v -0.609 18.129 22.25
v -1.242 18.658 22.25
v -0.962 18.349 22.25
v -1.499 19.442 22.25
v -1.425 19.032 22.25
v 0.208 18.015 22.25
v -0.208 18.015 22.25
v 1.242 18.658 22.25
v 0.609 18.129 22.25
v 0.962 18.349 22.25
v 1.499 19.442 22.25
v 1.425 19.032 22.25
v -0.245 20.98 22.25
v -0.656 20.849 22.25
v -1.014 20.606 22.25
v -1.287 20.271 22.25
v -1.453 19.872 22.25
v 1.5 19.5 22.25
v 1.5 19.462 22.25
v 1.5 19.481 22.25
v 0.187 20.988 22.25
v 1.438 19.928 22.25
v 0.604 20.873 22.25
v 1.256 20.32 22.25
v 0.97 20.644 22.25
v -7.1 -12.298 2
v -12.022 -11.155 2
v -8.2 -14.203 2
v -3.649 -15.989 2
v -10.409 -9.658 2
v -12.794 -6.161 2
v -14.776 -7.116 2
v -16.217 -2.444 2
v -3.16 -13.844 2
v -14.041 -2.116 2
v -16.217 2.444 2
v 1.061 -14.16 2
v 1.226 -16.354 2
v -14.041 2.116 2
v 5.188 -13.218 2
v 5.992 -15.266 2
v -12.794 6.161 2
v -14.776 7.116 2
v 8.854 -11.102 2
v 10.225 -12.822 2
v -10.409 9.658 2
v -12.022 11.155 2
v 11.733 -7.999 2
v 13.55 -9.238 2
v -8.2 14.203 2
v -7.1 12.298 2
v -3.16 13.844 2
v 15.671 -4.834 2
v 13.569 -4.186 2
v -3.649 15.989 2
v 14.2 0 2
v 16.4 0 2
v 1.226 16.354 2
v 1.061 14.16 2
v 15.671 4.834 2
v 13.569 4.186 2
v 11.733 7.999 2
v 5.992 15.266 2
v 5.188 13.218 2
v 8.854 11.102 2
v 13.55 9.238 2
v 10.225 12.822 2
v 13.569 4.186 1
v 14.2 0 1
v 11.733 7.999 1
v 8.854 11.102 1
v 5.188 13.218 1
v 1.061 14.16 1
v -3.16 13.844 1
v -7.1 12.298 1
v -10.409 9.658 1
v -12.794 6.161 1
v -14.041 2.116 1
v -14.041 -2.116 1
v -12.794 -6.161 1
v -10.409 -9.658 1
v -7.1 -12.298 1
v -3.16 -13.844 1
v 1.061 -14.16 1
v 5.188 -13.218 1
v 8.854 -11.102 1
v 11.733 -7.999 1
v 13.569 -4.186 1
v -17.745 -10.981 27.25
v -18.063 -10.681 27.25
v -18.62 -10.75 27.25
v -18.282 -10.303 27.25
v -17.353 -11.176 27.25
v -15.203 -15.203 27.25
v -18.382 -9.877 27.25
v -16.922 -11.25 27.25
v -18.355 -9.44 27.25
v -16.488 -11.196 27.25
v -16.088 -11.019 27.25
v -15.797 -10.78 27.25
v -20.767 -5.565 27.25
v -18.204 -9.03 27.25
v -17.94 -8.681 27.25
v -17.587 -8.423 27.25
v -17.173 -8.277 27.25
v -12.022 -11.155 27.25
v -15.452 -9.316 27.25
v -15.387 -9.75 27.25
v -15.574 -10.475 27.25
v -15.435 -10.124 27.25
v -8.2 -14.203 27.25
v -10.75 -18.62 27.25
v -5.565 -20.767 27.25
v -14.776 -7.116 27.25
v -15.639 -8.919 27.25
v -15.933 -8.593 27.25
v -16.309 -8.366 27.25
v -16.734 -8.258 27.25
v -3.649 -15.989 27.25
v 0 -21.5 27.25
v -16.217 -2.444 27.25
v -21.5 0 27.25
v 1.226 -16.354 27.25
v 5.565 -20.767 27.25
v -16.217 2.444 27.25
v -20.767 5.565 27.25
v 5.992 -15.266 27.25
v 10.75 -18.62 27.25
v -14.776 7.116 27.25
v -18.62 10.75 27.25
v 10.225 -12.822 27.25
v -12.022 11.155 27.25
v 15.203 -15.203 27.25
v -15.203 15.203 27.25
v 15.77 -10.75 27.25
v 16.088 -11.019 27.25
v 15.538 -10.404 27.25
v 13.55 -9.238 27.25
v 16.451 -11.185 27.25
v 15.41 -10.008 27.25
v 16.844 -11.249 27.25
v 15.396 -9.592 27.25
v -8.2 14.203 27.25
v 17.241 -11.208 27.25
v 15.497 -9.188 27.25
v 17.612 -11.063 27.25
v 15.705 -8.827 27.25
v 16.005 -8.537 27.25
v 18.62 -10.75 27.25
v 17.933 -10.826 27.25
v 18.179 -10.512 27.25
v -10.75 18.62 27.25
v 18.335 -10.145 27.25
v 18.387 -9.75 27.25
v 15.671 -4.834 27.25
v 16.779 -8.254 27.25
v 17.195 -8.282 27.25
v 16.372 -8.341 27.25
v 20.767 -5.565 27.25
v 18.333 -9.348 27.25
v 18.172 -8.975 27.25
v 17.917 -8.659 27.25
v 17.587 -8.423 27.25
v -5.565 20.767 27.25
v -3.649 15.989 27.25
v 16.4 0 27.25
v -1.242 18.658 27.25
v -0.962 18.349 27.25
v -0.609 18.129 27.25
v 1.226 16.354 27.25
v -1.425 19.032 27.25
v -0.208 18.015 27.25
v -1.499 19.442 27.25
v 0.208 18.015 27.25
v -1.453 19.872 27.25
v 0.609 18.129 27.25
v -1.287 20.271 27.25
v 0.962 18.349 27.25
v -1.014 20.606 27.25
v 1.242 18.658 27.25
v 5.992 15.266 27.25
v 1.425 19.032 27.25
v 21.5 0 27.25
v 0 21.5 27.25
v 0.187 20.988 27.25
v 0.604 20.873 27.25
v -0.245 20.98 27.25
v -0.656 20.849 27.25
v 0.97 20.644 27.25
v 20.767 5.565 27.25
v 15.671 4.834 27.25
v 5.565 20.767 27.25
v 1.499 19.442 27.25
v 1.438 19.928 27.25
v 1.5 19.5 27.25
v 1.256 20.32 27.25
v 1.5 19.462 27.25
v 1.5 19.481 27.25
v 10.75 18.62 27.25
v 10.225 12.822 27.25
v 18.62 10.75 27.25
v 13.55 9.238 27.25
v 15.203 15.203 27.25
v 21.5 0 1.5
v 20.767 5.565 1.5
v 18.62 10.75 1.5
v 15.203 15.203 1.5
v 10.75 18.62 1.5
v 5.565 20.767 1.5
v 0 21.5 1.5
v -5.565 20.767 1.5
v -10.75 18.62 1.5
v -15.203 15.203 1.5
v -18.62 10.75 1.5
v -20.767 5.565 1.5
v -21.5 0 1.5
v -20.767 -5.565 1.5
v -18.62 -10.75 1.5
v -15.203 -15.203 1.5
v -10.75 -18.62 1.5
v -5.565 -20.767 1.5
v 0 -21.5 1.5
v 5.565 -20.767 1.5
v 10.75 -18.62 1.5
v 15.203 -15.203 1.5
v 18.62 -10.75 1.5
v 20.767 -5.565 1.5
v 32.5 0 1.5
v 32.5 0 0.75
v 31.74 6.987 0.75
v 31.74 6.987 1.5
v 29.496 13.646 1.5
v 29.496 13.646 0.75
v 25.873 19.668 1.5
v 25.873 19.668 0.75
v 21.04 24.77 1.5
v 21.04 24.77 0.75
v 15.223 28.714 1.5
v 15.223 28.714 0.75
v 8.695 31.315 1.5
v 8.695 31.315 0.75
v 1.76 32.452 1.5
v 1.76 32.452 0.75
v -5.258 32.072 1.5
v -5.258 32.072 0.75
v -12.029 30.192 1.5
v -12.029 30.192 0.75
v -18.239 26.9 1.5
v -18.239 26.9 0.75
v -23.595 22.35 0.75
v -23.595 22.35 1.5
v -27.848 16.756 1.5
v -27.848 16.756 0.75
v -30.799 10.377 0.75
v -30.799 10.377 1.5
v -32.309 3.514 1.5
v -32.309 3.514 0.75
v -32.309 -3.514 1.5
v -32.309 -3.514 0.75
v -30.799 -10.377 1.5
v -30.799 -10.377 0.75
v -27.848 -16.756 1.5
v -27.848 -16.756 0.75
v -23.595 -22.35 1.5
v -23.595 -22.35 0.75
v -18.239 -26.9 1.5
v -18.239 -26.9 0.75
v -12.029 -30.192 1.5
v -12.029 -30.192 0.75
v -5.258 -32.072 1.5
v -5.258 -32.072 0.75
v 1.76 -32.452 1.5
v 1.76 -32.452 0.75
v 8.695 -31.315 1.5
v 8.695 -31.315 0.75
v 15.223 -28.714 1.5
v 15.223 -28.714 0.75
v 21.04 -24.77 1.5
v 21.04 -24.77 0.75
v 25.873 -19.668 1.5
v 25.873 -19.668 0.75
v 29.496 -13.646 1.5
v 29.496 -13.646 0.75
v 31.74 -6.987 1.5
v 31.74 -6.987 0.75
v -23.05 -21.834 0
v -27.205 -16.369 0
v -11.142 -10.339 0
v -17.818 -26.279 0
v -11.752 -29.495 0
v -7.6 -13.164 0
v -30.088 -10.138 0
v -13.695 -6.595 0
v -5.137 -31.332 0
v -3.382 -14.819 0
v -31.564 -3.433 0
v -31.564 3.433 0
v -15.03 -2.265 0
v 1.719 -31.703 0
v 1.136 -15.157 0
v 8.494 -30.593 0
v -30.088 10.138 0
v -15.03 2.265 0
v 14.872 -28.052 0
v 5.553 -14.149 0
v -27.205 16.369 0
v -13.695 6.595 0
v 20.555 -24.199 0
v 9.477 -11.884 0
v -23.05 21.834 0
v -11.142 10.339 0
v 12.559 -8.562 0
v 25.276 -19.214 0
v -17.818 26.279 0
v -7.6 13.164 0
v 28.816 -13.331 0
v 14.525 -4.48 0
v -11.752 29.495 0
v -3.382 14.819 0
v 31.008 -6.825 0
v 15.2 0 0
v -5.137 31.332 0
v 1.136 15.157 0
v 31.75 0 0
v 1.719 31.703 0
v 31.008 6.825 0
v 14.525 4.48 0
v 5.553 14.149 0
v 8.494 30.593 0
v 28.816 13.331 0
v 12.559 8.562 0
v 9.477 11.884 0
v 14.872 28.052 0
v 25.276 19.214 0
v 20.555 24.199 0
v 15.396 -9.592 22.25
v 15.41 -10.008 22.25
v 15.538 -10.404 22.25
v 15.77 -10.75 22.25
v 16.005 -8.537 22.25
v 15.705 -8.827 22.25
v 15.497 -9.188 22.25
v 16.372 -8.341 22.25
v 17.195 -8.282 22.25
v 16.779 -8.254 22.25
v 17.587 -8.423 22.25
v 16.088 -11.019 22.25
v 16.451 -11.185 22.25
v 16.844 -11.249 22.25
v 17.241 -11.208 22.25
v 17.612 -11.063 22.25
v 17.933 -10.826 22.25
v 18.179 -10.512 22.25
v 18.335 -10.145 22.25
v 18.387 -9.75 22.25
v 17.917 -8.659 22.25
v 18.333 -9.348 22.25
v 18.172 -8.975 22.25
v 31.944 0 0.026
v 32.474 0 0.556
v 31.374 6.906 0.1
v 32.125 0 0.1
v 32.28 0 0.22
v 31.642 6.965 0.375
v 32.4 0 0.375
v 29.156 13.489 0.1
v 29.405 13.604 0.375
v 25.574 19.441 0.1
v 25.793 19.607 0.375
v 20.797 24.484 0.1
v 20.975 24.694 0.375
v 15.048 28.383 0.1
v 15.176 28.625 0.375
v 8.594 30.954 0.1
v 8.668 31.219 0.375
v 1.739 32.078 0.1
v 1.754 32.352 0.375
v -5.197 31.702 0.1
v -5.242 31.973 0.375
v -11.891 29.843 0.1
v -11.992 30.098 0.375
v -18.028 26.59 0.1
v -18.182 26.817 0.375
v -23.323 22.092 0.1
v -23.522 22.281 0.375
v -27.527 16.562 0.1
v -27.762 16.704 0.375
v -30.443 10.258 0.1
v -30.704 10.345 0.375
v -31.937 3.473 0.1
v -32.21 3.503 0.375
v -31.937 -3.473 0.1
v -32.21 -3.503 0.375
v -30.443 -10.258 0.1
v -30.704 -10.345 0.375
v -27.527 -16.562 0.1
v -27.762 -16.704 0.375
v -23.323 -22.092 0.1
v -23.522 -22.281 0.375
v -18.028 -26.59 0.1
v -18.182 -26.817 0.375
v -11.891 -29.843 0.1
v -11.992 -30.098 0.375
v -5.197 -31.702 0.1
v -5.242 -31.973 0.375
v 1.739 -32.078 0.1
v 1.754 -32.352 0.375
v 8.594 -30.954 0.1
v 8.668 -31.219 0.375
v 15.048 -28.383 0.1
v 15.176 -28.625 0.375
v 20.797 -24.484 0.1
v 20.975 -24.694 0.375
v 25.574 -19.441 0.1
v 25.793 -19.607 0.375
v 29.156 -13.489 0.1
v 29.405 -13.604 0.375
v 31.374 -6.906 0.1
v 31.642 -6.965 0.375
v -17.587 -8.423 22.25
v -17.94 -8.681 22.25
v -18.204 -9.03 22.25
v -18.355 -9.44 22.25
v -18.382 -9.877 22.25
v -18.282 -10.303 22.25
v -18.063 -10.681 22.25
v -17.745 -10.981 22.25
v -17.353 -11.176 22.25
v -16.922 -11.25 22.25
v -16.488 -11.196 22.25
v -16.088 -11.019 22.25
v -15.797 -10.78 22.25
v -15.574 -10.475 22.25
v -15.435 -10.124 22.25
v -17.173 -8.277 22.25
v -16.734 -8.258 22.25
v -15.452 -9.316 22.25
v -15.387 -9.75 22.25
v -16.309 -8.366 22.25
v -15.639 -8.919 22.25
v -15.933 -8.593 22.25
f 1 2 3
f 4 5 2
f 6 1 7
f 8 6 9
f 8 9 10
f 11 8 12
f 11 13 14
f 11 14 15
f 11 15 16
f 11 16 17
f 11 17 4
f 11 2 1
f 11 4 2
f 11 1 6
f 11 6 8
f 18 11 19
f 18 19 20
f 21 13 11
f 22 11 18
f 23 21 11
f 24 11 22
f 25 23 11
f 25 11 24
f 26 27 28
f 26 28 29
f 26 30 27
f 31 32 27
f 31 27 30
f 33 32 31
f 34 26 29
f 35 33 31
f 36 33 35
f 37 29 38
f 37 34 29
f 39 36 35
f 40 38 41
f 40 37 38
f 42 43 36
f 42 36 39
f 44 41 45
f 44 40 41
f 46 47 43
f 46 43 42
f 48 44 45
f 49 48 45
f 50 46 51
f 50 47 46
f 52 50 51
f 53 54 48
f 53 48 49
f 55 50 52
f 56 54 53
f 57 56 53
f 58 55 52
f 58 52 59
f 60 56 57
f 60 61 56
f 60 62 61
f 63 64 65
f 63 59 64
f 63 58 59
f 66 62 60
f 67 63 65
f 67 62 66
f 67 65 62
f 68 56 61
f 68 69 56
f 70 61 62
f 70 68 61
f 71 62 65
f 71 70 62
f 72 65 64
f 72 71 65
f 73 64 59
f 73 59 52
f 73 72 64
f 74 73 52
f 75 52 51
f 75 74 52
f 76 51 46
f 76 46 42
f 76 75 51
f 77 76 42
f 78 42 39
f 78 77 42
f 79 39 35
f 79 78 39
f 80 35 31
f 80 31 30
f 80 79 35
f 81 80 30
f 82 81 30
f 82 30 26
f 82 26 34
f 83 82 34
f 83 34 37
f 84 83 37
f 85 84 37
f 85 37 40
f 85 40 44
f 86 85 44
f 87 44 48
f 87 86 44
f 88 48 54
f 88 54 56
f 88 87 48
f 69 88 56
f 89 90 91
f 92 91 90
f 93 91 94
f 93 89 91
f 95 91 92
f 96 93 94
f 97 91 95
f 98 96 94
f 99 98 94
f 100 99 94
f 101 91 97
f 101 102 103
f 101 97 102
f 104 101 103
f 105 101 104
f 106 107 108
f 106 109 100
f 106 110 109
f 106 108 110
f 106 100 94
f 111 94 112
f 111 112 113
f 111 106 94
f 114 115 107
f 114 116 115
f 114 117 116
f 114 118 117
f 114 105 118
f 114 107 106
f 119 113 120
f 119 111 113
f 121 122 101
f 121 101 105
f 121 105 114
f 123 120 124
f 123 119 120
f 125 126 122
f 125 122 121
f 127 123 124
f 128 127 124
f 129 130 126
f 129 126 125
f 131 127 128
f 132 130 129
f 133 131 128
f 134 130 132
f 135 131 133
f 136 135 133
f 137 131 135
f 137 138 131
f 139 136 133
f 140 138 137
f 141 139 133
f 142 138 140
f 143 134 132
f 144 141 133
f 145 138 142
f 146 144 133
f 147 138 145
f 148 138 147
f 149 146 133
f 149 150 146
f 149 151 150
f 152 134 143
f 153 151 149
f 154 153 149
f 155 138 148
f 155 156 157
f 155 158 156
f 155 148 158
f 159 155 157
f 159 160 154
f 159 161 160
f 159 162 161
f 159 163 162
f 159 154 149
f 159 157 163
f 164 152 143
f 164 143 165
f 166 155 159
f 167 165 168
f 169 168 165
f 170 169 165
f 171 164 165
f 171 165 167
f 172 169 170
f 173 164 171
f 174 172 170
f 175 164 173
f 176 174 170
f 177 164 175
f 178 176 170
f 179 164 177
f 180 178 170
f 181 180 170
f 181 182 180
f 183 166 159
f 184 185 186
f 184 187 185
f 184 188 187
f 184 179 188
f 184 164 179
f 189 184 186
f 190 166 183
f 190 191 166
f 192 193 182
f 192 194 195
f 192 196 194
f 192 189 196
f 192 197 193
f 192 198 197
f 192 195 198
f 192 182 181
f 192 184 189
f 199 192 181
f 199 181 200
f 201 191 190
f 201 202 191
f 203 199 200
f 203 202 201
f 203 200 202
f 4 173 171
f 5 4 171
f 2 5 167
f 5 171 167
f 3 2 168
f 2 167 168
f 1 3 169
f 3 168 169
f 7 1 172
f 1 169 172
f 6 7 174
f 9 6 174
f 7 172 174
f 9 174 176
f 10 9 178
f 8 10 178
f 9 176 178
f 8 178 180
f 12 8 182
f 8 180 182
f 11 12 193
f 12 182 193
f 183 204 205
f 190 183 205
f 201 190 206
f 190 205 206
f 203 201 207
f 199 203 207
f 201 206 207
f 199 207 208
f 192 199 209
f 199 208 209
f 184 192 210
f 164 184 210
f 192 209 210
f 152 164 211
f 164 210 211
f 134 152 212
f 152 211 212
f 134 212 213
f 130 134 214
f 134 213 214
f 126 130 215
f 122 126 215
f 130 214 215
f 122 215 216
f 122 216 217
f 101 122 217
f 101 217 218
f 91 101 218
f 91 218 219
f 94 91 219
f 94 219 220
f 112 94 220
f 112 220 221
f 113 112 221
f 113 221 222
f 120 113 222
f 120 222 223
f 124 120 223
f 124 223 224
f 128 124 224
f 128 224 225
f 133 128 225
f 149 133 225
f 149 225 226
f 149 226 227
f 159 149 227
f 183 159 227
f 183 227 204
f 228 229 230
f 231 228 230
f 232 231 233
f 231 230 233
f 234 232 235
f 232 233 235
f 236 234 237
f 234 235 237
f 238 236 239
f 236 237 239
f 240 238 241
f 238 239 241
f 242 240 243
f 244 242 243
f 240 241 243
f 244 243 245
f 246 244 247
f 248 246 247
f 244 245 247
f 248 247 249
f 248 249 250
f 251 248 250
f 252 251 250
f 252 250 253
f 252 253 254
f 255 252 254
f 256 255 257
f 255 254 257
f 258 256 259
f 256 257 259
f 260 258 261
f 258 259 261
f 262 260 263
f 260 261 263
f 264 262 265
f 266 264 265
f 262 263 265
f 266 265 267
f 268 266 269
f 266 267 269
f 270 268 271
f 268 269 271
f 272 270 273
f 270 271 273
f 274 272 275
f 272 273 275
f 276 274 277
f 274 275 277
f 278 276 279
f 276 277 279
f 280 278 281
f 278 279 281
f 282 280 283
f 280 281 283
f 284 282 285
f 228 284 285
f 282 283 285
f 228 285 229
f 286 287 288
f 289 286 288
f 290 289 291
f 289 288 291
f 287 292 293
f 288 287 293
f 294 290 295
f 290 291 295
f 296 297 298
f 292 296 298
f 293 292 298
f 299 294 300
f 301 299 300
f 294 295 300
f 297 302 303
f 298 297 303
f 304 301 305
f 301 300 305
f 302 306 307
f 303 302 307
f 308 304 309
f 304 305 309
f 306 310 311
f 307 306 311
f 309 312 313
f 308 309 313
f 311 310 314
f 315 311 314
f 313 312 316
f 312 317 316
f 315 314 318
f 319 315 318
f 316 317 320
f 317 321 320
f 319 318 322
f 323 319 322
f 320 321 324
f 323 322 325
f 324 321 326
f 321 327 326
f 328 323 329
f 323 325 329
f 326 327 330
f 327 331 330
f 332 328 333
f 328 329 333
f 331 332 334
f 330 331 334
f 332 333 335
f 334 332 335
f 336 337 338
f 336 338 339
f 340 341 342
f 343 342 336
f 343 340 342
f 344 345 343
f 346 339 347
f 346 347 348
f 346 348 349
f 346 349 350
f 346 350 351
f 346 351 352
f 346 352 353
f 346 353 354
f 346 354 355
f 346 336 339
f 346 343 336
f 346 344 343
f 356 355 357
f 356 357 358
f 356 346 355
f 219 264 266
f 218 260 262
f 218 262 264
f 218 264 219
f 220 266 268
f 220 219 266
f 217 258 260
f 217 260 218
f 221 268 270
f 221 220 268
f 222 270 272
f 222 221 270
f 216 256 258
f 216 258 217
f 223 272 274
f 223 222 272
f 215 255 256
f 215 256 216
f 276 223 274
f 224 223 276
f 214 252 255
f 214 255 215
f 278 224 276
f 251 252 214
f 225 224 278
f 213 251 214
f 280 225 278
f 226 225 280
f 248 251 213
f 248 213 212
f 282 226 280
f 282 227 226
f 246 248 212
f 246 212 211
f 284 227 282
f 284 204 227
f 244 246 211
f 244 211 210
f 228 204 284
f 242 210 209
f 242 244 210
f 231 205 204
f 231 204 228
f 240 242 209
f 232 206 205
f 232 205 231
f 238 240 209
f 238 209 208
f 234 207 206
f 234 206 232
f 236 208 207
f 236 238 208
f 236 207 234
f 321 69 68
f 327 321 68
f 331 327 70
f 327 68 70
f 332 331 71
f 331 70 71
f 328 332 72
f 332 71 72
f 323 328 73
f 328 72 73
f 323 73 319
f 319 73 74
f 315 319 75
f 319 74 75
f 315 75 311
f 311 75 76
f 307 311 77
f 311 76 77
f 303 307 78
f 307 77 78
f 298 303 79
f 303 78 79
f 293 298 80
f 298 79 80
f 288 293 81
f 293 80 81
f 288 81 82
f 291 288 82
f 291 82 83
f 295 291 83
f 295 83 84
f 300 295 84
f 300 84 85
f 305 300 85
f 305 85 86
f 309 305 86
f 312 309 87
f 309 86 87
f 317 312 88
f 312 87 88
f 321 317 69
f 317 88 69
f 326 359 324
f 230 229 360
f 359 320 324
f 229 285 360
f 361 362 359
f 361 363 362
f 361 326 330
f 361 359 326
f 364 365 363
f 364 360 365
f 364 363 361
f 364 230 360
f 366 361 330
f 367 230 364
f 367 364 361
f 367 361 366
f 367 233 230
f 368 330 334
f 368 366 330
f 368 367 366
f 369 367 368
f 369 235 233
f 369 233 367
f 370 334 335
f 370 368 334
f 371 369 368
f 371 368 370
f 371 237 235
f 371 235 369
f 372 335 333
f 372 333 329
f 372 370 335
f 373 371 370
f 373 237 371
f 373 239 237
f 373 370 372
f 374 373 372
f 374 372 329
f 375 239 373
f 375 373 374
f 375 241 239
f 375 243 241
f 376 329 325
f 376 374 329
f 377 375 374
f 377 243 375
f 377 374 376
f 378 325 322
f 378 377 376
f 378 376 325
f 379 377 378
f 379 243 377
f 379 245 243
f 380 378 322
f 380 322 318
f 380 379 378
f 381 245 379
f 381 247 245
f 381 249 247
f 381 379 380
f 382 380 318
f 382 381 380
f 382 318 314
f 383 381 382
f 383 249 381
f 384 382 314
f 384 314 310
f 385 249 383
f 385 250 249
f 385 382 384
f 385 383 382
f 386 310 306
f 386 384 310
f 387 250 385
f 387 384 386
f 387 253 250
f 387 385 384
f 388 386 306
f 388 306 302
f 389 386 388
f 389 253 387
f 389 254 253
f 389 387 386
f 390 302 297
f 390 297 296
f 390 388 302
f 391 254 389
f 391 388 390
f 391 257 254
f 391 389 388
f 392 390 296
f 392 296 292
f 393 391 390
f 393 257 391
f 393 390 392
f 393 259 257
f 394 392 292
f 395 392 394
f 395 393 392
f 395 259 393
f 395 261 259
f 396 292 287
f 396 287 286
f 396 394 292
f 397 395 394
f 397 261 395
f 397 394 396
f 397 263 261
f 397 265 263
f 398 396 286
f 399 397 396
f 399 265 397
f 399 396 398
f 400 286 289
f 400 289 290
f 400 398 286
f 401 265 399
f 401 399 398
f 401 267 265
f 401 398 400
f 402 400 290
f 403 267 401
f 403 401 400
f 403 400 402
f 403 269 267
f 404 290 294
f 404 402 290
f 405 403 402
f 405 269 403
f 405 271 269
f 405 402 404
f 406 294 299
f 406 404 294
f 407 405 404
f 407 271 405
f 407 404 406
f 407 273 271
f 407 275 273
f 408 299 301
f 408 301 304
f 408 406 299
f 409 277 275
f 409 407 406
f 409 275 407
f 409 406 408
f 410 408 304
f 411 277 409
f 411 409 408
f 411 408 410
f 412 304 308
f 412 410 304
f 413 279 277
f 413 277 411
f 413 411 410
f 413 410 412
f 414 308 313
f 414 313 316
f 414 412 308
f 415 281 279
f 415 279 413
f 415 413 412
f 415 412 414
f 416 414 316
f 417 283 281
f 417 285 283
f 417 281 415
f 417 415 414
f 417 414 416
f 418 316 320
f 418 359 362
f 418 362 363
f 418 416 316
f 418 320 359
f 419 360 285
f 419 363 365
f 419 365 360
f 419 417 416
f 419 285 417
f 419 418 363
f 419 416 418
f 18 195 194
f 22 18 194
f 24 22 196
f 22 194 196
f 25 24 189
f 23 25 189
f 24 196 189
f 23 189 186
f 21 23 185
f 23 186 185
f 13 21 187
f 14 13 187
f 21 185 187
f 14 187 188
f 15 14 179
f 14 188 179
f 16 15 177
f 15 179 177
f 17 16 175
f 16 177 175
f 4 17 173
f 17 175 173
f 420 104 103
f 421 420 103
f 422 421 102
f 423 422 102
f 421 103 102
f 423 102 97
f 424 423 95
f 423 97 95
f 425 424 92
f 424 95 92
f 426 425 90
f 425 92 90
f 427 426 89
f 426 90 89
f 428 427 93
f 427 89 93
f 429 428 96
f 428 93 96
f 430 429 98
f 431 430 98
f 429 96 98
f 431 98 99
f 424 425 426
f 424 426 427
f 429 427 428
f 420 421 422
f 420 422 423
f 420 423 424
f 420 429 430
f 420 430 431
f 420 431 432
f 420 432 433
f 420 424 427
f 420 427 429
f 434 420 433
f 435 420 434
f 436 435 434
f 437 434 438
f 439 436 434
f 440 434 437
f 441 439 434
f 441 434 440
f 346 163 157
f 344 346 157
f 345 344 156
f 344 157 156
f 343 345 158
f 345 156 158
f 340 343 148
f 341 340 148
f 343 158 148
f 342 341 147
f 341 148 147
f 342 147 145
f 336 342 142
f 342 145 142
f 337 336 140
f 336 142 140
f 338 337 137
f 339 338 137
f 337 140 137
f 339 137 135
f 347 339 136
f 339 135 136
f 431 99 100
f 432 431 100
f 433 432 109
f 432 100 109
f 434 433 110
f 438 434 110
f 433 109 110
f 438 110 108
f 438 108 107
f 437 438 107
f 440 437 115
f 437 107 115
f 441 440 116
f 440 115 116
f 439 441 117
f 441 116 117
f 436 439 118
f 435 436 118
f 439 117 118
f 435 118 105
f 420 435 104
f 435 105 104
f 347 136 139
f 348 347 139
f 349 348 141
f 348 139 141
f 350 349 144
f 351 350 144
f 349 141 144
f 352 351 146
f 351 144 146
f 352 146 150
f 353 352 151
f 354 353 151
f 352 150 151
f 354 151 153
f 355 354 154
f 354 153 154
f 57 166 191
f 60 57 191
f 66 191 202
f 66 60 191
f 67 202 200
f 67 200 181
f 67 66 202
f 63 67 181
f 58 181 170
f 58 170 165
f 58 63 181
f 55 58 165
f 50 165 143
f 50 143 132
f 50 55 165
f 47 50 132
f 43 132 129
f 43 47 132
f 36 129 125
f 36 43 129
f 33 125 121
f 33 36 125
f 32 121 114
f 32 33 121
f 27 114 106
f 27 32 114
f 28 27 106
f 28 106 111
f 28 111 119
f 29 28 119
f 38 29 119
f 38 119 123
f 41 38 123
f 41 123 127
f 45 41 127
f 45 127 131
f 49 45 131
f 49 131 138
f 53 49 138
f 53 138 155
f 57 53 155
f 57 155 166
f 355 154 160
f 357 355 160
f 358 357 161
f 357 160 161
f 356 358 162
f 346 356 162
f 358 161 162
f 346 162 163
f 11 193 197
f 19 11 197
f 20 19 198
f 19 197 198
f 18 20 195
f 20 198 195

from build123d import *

# Parameters (mm, degrees)
F0_R     = 21.5
F0_R_2   = 16.4
F1_DEPTH = 27.25
F0_R_3   = 32.5
F2_DEPTH = 1.5
F0_R_4   = 14.2
F3_DEPTH = 1
F5_DEPTH = 5
F6_R     = 0.75
F7_SIZE  = 0.99999
F8_DEPTH = 1


# Not quite as in the source:
# - a fillet or chamfer is up to 0.001 mm smaller than in the source, because OpenCascade refuses the exact size


with BuildPart() as f1:
    # F0 (on Top) → F1 (new body)
    with BuildSketch(Plane.XY):
        Circle(F0_R)
        Circle(F0_R_2, mode=Mode.SUBTRACT)
    extrude(amount=F1_DEPTH)

    # F0 (on Top) → F2 (join)
    with BuildSketch(Plane.XY):
        Circle(F0_R_3)
        Circle(F0_R, mode=Mode.SUBTRACT)
    extrude(amount=F2_DEPTH)

    # F0 (on Top) → F3 (join)
    with BuildSketch(Plane.XY):
        Circle(F0_R_2)
        Circle(F0_R_4, mode=Mode.SUBTRACT)
    extrude(amount=F3_DEPTH)

    # F4 (on face) → F5 (cut)
    with BuildSketch(Plane.XY.offset(27.25)):
        with BuildLine():
            ThreePointArc((-1.4988901219, 19.4423076923), (0, 18), (1.4988901219, 19.4423076923))
            ThreePointArc((1.4988901219, 19.4423076923), (0, 19.5), (-1.4988901219, 19.4423076923))
        make_face()
        with BuildLine():
            ThreePointArc((-1.4988901219, 19.4423076923), (0, 19.5), (1.4988901219, 19.4423076923))
            ThreePointArc((1.4988901219, 19.4423076923), (1.4997225048, 19.4711485087), (1.5, 19.5))
            ThreePointArc((1.5, 19.5), (-0.0288514913, 20.9997225048), (-1.4988901219, 19.4423076923))
        make_face()
        with BuildLine():
            ThreePointArc((18.3874953738, -9.75), (18.171867416, -8.9751526232), (17.5869774307, -8.4230769231))
            ThreePointArc((17.5869774307, -8.4230769231), (16.8874953738, -9.75), (16.0880873088, -11.0192307692))
            ThreePointArc((16.0880873088, -11.0192307692), (17.6123705018, -11.0632235334), (18.3874953738, -9.75))
        make_face()
        with BuildLine():
            ThreePointArc((16.0880873088, -11.0192307692), (16.8874953738, -9.75), (17.5869774307, -8.4230769231))
            ThreePointArc((17.5869774307, -8.4230769231), (15.5884572681, -9), (16.0880873088, -11.0192307692))
        make_face()
        with BuildLine():
            ThreePointArc((-15.3874953738, -9.75), (-16.112647997, -8.4656279578), (-17.5869774307, -8.4230769231))
            ThreePointArc((-17.5869774307, -8.4230769231), (-16.8874953738, -9.75), (-16.0880873088, -11.0192307692))
            ThreePointArc((-16.0880873088, -11.0192307692), (-15.5742718404, -10.474875128), (-15.3874953738, -9.75))
        make_face()
        with BuildLine():
            ThreePointArc((-16.0880873088, -11.0192307692), (-16.8874953738, -9.75), (-17.5869774307, -8.4230769231))
            ThreePointArc((-17.5869774307, -8.4230769231), (-18.1865334795, -10.5), (-16.0880873088, -11.0192307692))
        make_face()
    extrude(amount=-F5_DEPTH, mode=Mode.SUBTRACT)

    # F6
    f6_edges = [f1.edges().sort_by_distance(p)[0] for p in [
        (-32.5, 0, 0),
    ]]
    fillet(f6_edges, radius=F6_R)

    # F7 (size 1 in the source; OpenCascade refuses exactly that, so slightly less here)
    f7_edges = [f1.edges().sort_by_distance(p)[0] for p in [
        (-14.2, 0, 0),
    ]]
    chamfer(f7_edges, length=F7_SIZE)

    # F8 (add): a face of the model
    f8_faces = [f1.faces().sort_by_distance(p)[0] for p in [
        (-15.9361379515, 0, 1),
    ]]
    extrude(f8_faces, amount=F8_DEPTH)


solid = f1.part
